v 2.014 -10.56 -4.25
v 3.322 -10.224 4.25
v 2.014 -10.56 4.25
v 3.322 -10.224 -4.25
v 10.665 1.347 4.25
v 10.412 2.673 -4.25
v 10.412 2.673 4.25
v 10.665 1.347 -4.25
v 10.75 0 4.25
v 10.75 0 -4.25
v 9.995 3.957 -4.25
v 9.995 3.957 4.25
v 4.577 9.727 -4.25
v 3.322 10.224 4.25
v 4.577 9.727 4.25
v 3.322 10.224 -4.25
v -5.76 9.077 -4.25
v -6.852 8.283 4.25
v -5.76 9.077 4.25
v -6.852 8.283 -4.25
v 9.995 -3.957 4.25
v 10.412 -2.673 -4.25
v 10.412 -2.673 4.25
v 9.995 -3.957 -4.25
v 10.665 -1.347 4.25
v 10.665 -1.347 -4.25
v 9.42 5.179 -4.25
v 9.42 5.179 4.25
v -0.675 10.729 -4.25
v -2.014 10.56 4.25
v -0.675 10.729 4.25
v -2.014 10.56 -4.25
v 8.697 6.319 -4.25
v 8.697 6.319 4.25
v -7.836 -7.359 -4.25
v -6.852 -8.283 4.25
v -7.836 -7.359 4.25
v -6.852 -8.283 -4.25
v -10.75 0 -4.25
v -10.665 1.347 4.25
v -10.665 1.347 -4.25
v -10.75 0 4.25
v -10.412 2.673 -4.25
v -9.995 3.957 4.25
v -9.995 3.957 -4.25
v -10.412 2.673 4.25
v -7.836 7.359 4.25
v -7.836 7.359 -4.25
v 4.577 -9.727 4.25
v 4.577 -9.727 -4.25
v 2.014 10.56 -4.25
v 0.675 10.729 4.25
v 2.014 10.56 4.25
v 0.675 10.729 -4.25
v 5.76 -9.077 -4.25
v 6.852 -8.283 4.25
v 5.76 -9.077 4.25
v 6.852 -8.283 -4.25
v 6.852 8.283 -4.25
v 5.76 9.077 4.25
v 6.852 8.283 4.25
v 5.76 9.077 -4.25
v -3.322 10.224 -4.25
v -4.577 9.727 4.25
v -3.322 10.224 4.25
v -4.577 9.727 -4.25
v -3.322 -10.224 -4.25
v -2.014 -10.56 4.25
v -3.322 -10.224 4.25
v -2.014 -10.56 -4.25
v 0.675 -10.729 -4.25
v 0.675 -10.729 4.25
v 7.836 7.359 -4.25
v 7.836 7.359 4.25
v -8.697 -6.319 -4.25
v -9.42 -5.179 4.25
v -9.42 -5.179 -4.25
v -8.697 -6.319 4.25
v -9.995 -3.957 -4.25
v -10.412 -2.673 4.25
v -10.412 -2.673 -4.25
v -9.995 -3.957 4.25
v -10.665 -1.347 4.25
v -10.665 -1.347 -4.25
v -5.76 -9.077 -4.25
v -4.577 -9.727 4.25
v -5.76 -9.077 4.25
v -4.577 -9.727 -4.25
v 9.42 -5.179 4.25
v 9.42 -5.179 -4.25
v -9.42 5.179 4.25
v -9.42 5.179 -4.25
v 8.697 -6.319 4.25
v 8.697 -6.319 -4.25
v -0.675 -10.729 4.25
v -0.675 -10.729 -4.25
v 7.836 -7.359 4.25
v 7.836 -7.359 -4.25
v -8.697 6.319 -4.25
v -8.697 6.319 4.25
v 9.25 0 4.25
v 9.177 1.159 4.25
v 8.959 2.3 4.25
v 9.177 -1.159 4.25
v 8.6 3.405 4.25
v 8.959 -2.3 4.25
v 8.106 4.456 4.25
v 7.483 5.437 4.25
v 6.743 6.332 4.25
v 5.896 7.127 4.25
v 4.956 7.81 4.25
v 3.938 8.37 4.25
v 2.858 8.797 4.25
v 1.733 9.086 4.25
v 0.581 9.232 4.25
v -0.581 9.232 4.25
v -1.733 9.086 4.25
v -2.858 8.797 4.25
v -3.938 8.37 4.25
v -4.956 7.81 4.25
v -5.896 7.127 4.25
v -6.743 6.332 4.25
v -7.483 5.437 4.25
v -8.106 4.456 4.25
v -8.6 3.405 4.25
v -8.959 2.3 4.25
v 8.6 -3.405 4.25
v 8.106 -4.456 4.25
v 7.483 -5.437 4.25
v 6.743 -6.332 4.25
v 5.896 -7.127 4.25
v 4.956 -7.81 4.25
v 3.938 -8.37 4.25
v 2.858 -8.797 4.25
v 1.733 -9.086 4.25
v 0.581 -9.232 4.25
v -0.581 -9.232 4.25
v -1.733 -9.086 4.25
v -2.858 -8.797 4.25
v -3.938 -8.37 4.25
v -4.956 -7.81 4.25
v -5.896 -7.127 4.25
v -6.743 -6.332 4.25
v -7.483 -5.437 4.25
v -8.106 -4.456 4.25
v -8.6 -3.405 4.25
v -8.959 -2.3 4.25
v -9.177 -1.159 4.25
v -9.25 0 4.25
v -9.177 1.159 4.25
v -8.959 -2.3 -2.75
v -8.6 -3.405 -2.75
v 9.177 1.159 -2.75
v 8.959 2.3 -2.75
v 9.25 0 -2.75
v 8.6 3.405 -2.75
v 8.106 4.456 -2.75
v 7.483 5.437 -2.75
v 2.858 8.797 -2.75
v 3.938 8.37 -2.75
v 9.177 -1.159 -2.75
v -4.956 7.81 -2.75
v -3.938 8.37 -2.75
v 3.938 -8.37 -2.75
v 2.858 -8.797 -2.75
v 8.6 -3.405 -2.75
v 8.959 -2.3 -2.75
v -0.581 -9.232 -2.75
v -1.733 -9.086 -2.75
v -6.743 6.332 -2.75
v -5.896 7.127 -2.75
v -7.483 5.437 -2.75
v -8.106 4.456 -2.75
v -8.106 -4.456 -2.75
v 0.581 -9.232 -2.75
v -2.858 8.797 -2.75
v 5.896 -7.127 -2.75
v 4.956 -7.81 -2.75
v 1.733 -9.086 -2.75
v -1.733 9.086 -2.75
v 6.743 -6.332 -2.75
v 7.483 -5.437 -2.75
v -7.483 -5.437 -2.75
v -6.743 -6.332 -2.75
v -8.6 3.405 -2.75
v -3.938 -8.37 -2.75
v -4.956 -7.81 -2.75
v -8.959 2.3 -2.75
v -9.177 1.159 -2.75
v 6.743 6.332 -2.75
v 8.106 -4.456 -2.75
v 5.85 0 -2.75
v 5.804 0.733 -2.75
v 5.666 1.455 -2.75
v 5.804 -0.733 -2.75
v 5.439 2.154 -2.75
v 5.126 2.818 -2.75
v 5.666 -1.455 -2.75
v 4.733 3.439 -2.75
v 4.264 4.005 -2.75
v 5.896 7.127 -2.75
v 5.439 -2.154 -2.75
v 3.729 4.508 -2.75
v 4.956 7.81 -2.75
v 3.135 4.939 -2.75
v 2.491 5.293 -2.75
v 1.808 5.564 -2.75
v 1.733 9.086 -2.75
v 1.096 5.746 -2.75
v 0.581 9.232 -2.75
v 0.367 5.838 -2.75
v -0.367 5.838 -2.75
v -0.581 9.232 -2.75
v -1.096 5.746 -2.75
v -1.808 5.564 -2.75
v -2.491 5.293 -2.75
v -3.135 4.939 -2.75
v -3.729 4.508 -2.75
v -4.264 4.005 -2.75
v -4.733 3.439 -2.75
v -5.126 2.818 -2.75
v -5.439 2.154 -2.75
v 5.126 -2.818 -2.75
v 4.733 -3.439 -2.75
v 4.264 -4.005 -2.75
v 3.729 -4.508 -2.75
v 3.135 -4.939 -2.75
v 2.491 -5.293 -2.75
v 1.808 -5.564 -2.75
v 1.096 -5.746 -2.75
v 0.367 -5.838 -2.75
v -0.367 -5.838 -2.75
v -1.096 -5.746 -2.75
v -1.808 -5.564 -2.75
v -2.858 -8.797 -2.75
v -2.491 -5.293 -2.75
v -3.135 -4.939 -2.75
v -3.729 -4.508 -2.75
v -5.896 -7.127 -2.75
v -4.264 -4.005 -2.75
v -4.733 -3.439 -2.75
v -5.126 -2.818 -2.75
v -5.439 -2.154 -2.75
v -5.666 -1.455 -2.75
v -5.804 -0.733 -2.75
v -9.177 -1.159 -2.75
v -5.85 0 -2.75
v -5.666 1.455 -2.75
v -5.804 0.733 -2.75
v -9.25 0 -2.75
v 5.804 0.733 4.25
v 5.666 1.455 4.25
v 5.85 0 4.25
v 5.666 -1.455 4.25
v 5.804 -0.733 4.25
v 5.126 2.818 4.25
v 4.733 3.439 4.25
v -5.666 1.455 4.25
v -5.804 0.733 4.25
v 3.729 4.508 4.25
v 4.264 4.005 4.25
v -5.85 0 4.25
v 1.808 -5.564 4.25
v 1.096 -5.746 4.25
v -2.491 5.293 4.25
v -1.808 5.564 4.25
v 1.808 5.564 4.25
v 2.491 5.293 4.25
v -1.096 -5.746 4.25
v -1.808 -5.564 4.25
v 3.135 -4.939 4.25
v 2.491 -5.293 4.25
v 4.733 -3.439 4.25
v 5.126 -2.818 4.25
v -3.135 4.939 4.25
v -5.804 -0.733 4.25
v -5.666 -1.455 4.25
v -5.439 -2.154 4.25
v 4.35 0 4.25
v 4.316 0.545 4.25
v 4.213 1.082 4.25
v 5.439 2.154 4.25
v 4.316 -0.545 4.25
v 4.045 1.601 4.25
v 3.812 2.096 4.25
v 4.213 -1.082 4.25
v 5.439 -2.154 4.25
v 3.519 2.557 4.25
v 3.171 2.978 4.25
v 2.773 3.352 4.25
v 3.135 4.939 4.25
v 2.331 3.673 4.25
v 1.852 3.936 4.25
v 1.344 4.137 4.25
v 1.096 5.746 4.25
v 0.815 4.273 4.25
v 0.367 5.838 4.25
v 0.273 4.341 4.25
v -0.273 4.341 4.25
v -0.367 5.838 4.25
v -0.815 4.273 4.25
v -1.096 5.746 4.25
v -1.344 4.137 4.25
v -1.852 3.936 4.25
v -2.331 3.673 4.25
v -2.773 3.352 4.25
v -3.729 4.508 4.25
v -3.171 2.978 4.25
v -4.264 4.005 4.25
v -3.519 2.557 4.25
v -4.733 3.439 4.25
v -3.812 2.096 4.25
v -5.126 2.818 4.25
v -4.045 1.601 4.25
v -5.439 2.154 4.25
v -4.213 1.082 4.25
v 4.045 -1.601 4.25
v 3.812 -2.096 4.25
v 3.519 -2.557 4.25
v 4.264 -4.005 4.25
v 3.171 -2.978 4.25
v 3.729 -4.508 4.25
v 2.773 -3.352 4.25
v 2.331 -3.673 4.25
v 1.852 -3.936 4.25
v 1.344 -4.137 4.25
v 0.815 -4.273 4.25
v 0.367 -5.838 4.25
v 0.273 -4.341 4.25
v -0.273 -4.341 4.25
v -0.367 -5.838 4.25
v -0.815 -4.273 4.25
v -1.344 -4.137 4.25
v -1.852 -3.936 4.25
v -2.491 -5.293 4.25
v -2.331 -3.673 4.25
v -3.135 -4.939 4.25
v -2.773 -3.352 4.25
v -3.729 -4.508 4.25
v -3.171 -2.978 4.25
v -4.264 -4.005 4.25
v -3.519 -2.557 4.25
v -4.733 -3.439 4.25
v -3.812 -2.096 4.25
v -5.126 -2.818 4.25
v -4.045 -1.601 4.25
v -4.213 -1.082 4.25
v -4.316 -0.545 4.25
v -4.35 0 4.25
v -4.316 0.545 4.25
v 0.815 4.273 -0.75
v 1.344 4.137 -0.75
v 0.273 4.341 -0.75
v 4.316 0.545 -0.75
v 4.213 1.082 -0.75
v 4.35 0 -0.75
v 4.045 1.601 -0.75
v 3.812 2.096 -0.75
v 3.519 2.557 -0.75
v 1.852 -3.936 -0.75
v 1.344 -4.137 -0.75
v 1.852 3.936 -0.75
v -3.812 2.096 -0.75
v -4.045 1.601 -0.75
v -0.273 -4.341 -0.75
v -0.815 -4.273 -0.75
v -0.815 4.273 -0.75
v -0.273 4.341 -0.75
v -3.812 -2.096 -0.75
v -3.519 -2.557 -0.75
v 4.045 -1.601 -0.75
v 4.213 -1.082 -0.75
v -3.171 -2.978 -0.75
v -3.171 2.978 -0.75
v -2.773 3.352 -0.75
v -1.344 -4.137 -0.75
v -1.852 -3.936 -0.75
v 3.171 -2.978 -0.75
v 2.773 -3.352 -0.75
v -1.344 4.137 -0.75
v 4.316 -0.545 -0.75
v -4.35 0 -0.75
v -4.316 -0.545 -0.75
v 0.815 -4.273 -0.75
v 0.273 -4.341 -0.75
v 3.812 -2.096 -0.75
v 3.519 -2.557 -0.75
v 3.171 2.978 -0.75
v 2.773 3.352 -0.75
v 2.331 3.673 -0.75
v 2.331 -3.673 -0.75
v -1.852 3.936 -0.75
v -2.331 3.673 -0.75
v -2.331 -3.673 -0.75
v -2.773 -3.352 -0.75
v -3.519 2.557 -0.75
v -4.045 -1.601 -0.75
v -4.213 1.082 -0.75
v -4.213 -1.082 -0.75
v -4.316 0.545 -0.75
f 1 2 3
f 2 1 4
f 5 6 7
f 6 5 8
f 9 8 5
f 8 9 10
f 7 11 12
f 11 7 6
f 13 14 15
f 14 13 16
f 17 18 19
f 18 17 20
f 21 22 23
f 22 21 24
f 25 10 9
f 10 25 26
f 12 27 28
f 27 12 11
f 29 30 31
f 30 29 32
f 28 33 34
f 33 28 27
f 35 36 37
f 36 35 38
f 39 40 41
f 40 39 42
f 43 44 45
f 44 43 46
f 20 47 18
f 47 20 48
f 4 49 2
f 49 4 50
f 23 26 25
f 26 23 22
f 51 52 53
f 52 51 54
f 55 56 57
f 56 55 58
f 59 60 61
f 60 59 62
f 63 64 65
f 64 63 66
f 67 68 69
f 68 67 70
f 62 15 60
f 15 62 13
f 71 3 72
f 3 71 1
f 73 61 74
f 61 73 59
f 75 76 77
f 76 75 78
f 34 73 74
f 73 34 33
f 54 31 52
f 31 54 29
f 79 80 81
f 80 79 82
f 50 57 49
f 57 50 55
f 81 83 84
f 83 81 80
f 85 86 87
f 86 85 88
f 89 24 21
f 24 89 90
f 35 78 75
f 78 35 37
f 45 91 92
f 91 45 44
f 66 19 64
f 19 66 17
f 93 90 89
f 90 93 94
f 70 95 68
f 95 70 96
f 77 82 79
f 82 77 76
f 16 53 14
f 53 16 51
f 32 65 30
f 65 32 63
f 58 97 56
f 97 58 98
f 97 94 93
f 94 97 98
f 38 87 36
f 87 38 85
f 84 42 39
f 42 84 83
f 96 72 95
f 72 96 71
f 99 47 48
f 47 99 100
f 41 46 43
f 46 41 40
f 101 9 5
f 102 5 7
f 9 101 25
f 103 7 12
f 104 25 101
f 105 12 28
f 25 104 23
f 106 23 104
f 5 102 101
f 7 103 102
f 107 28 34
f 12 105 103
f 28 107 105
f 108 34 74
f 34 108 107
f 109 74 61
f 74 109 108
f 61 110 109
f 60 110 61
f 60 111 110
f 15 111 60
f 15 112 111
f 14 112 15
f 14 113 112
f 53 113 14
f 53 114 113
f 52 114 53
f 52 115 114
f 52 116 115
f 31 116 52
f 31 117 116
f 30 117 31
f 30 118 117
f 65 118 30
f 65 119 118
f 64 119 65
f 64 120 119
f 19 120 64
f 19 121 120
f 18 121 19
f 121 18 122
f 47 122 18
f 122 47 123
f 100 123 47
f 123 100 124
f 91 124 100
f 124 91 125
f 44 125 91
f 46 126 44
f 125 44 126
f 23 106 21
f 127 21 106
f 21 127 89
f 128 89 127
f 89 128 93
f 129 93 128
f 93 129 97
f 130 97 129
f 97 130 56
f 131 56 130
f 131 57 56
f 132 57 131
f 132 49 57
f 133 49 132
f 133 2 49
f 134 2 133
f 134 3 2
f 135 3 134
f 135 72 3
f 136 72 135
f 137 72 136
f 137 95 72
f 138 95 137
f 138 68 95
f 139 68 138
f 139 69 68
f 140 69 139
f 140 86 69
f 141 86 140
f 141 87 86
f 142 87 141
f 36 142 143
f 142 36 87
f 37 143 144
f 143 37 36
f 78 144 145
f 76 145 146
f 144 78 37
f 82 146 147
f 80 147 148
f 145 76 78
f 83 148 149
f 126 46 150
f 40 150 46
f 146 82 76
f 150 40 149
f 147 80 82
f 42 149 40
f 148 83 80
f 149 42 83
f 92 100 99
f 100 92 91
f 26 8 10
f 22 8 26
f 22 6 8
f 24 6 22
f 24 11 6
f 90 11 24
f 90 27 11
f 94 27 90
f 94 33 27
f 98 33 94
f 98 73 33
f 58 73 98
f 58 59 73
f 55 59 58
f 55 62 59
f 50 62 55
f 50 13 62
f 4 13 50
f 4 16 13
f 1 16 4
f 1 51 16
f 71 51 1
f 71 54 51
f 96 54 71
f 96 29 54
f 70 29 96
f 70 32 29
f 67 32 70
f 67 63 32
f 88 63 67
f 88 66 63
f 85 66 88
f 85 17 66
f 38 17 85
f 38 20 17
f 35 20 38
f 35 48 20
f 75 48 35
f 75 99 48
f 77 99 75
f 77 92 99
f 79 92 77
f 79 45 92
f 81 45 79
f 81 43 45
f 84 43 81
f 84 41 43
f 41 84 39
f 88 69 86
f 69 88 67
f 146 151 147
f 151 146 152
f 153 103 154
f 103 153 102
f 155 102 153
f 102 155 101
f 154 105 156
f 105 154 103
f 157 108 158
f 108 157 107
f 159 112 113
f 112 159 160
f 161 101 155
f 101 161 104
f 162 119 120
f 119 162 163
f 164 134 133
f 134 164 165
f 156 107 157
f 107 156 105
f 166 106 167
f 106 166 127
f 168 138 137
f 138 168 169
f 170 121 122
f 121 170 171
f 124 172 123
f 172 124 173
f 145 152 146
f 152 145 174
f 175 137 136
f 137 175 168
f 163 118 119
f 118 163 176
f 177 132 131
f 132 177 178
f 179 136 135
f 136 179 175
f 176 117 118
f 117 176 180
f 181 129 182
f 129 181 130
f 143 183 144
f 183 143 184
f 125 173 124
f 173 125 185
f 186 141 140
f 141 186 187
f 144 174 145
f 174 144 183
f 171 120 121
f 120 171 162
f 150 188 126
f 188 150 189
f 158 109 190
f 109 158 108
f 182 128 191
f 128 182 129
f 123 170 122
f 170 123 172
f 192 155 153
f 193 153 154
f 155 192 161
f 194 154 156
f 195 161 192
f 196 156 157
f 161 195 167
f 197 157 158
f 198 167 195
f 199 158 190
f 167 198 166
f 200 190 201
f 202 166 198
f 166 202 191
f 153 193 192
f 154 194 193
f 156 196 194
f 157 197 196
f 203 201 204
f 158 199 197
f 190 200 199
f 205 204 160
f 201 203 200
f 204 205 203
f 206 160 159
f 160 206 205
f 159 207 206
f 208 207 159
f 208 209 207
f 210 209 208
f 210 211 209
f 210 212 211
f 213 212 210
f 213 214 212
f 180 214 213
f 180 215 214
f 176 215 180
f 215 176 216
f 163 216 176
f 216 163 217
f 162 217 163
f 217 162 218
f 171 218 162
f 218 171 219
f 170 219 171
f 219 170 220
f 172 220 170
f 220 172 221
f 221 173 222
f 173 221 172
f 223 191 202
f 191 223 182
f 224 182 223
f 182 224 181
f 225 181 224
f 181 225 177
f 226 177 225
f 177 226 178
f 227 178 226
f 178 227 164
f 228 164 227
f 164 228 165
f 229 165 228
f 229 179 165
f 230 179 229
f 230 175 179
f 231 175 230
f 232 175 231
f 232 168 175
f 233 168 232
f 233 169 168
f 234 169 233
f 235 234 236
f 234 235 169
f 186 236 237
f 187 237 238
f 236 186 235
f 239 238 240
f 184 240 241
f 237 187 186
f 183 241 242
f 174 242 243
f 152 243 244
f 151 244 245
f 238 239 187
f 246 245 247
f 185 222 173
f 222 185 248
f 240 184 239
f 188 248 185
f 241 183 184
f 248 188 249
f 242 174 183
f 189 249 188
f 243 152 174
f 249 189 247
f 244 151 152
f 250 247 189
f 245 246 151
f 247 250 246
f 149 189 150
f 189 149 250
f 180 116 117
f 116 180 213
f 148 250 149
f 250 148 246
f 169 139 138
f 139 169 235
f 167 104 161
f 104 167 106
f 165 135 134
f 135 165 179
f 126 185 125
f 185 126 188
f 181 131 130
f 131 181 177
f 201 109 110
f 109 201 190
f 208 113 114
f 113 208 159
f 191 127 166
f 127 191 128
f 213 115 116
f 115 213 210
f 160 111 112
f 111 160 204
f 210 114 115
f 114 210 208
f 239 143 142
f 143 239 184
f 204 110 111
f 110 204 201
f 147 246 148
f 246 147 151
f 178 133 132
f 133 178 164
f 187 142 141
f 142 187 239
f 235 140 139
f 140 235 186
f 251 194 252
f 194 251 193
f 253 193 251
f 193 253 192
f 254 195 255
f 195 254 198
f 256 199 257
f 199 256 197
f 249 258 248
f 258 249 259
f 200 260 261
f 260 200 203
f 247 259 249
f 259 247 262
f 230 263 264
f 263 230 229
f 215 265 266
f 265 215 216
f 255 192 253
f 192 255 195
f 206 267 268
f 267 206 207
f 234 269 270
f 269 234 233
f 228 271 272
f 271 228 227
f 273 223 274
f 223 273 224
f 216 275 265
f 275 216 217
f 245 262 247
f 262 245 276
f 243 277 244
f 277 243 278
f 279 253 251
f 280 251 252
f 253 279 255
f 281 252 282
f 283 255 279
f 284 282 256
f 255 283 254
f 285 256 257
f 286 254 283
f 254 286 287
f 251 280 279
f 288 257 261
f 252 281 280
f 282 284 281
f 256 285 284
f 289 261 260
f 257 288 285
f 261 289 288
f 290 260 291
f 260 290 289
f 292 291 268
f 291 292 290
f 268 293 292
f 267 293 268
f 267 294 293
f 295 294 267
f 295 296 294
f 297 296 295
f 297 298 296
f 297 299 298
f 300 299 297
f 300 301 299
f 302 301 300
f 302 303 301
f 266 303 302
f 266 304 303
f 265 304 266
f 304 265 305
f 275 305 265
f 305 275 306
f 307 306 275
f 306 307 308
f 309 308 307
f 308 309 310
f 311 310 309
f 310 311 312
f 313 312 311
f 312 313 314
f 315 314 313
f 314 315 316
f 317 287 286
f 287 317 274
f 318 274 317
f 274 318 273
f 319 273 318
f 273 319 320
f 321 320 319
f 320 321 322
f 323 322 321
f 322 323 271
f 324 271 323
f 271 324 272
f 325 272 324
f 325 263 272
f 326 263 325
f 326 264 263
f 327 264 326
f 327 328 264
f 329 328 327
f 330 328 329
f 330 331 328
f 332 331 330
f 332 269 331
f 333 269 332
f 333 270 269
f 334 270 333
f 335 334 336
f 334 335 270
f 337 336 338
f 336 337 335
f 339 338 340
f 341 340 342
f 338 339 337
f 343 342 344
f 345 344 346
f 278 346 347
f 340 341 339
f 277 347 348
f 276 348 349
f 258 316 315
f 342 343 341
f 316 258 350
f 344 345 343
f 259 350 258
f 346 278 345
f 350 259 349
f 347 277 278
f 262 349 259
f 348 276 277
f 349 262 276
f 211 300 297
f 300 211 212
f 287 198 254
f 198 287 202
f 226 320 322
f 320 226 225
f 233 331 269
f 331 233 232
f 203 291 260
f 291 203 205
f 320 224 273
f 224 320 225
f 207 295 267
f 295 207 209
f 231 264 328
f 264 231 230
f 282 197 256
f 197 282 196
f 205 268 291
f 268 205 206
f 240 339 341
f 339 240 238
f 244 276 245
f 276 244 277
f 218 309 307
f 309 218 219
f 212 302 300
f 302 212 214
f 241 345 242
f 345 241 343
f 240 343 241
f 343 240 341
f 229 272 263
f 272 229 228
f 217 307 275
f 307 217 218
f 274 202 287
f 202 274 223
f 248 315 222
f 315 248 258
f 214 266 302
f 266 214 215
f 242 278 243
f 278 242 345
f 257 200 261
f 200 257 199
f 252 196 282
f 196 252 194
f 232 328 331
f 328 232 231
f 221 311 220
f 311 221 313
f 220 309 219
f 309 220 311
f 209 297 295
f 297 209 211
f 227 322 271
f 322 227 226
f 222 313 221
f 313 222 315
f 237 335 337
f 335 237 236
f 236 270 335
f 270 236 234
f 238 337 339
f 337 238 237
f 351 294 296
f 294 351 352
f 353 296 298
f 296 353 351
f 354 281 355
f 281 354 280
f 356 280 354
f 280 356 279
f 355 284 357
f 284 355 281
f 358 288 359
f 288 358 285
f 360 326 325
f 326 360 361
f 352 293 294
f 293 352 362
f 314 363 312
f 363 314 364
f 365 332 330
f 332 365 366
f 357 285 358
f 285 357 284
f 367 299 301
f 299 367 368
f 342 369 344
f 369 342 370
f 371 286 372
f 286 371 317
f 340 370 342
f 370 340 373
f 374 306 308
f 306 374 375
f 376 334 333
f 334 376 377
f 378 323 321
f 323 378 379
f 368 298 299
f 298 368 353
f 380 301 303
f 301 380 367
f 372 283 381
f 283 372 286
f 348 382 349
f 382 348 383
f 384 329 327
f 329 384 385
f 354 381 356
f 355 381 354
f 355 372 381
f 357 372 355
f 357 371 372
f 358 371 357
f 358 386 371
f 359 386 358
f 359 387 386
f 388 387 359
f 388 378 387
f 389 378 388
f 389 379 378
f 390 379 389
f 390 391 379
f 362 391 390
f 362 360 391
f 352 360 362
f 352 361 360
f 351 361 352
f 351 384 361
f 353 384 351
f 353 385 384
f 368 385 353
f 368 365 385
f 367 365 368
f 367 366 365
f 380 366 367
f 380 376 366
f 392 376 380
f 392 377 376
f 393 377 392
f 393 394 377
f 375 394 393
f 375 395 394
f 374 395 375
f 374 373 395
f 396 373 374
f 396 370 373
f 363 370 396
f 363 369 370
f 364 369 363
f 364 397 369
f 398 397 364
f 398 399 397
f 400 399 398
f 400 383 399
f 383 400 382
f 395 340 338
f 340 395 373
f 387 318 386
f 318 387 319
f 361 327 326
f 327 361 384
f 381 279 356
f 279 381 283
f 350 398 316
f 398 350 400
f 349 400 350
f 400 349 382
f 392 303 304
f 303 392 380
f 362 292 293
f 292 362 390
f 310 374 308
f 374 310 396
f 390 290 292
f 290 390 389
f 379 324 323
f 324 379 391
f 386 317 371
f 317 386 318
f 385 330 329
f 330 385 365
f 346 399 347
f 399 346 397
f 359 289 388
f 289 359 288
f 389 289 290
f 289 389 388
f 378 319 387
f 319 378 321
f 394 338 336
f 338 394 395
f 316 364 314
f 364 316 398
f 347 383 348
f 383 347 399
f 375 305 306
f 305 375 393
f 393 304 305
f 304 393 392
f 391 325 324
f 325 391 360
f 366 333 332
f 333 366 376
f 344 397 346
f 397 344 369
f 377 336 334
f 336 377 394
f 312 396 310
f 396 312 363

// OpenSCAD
// Radius of the bottle neck
bottlerad=9.25;
// The thick of the bottle border
border=3.4; 

// The printed thickness of the borders
thick=1.5; 
// How long the bottle will penetrate into the cap
depth=7; // [5:15]


// Extra value for the printed top of the cap
top=1.5;

// Examples

// Danacol Dia
//bottlerad=28.4/2;
//border=2.7;

// Naturhouse
//bottlerad=18.5/2;
//border=3.4;

// Rose wine
//bottlerad=28/2;
//border=6;

difference(){
cylinder(h=depth+top, r=bottlerad+thick, $fn=50, center=true);
translate([0,0,top]) cylinder(h=depth+top, r=bottlerad, $fn=50, center=true);    
}
difference(){
translate([0,0,0]) cylinder(h=depth+top, r=bottlerad-border, $fn=50, center=true);
translate([0,0,top+2]) cylinder(h=depth+top, r=bottlerad-border-thick, $fn=50, center=true);    
}
